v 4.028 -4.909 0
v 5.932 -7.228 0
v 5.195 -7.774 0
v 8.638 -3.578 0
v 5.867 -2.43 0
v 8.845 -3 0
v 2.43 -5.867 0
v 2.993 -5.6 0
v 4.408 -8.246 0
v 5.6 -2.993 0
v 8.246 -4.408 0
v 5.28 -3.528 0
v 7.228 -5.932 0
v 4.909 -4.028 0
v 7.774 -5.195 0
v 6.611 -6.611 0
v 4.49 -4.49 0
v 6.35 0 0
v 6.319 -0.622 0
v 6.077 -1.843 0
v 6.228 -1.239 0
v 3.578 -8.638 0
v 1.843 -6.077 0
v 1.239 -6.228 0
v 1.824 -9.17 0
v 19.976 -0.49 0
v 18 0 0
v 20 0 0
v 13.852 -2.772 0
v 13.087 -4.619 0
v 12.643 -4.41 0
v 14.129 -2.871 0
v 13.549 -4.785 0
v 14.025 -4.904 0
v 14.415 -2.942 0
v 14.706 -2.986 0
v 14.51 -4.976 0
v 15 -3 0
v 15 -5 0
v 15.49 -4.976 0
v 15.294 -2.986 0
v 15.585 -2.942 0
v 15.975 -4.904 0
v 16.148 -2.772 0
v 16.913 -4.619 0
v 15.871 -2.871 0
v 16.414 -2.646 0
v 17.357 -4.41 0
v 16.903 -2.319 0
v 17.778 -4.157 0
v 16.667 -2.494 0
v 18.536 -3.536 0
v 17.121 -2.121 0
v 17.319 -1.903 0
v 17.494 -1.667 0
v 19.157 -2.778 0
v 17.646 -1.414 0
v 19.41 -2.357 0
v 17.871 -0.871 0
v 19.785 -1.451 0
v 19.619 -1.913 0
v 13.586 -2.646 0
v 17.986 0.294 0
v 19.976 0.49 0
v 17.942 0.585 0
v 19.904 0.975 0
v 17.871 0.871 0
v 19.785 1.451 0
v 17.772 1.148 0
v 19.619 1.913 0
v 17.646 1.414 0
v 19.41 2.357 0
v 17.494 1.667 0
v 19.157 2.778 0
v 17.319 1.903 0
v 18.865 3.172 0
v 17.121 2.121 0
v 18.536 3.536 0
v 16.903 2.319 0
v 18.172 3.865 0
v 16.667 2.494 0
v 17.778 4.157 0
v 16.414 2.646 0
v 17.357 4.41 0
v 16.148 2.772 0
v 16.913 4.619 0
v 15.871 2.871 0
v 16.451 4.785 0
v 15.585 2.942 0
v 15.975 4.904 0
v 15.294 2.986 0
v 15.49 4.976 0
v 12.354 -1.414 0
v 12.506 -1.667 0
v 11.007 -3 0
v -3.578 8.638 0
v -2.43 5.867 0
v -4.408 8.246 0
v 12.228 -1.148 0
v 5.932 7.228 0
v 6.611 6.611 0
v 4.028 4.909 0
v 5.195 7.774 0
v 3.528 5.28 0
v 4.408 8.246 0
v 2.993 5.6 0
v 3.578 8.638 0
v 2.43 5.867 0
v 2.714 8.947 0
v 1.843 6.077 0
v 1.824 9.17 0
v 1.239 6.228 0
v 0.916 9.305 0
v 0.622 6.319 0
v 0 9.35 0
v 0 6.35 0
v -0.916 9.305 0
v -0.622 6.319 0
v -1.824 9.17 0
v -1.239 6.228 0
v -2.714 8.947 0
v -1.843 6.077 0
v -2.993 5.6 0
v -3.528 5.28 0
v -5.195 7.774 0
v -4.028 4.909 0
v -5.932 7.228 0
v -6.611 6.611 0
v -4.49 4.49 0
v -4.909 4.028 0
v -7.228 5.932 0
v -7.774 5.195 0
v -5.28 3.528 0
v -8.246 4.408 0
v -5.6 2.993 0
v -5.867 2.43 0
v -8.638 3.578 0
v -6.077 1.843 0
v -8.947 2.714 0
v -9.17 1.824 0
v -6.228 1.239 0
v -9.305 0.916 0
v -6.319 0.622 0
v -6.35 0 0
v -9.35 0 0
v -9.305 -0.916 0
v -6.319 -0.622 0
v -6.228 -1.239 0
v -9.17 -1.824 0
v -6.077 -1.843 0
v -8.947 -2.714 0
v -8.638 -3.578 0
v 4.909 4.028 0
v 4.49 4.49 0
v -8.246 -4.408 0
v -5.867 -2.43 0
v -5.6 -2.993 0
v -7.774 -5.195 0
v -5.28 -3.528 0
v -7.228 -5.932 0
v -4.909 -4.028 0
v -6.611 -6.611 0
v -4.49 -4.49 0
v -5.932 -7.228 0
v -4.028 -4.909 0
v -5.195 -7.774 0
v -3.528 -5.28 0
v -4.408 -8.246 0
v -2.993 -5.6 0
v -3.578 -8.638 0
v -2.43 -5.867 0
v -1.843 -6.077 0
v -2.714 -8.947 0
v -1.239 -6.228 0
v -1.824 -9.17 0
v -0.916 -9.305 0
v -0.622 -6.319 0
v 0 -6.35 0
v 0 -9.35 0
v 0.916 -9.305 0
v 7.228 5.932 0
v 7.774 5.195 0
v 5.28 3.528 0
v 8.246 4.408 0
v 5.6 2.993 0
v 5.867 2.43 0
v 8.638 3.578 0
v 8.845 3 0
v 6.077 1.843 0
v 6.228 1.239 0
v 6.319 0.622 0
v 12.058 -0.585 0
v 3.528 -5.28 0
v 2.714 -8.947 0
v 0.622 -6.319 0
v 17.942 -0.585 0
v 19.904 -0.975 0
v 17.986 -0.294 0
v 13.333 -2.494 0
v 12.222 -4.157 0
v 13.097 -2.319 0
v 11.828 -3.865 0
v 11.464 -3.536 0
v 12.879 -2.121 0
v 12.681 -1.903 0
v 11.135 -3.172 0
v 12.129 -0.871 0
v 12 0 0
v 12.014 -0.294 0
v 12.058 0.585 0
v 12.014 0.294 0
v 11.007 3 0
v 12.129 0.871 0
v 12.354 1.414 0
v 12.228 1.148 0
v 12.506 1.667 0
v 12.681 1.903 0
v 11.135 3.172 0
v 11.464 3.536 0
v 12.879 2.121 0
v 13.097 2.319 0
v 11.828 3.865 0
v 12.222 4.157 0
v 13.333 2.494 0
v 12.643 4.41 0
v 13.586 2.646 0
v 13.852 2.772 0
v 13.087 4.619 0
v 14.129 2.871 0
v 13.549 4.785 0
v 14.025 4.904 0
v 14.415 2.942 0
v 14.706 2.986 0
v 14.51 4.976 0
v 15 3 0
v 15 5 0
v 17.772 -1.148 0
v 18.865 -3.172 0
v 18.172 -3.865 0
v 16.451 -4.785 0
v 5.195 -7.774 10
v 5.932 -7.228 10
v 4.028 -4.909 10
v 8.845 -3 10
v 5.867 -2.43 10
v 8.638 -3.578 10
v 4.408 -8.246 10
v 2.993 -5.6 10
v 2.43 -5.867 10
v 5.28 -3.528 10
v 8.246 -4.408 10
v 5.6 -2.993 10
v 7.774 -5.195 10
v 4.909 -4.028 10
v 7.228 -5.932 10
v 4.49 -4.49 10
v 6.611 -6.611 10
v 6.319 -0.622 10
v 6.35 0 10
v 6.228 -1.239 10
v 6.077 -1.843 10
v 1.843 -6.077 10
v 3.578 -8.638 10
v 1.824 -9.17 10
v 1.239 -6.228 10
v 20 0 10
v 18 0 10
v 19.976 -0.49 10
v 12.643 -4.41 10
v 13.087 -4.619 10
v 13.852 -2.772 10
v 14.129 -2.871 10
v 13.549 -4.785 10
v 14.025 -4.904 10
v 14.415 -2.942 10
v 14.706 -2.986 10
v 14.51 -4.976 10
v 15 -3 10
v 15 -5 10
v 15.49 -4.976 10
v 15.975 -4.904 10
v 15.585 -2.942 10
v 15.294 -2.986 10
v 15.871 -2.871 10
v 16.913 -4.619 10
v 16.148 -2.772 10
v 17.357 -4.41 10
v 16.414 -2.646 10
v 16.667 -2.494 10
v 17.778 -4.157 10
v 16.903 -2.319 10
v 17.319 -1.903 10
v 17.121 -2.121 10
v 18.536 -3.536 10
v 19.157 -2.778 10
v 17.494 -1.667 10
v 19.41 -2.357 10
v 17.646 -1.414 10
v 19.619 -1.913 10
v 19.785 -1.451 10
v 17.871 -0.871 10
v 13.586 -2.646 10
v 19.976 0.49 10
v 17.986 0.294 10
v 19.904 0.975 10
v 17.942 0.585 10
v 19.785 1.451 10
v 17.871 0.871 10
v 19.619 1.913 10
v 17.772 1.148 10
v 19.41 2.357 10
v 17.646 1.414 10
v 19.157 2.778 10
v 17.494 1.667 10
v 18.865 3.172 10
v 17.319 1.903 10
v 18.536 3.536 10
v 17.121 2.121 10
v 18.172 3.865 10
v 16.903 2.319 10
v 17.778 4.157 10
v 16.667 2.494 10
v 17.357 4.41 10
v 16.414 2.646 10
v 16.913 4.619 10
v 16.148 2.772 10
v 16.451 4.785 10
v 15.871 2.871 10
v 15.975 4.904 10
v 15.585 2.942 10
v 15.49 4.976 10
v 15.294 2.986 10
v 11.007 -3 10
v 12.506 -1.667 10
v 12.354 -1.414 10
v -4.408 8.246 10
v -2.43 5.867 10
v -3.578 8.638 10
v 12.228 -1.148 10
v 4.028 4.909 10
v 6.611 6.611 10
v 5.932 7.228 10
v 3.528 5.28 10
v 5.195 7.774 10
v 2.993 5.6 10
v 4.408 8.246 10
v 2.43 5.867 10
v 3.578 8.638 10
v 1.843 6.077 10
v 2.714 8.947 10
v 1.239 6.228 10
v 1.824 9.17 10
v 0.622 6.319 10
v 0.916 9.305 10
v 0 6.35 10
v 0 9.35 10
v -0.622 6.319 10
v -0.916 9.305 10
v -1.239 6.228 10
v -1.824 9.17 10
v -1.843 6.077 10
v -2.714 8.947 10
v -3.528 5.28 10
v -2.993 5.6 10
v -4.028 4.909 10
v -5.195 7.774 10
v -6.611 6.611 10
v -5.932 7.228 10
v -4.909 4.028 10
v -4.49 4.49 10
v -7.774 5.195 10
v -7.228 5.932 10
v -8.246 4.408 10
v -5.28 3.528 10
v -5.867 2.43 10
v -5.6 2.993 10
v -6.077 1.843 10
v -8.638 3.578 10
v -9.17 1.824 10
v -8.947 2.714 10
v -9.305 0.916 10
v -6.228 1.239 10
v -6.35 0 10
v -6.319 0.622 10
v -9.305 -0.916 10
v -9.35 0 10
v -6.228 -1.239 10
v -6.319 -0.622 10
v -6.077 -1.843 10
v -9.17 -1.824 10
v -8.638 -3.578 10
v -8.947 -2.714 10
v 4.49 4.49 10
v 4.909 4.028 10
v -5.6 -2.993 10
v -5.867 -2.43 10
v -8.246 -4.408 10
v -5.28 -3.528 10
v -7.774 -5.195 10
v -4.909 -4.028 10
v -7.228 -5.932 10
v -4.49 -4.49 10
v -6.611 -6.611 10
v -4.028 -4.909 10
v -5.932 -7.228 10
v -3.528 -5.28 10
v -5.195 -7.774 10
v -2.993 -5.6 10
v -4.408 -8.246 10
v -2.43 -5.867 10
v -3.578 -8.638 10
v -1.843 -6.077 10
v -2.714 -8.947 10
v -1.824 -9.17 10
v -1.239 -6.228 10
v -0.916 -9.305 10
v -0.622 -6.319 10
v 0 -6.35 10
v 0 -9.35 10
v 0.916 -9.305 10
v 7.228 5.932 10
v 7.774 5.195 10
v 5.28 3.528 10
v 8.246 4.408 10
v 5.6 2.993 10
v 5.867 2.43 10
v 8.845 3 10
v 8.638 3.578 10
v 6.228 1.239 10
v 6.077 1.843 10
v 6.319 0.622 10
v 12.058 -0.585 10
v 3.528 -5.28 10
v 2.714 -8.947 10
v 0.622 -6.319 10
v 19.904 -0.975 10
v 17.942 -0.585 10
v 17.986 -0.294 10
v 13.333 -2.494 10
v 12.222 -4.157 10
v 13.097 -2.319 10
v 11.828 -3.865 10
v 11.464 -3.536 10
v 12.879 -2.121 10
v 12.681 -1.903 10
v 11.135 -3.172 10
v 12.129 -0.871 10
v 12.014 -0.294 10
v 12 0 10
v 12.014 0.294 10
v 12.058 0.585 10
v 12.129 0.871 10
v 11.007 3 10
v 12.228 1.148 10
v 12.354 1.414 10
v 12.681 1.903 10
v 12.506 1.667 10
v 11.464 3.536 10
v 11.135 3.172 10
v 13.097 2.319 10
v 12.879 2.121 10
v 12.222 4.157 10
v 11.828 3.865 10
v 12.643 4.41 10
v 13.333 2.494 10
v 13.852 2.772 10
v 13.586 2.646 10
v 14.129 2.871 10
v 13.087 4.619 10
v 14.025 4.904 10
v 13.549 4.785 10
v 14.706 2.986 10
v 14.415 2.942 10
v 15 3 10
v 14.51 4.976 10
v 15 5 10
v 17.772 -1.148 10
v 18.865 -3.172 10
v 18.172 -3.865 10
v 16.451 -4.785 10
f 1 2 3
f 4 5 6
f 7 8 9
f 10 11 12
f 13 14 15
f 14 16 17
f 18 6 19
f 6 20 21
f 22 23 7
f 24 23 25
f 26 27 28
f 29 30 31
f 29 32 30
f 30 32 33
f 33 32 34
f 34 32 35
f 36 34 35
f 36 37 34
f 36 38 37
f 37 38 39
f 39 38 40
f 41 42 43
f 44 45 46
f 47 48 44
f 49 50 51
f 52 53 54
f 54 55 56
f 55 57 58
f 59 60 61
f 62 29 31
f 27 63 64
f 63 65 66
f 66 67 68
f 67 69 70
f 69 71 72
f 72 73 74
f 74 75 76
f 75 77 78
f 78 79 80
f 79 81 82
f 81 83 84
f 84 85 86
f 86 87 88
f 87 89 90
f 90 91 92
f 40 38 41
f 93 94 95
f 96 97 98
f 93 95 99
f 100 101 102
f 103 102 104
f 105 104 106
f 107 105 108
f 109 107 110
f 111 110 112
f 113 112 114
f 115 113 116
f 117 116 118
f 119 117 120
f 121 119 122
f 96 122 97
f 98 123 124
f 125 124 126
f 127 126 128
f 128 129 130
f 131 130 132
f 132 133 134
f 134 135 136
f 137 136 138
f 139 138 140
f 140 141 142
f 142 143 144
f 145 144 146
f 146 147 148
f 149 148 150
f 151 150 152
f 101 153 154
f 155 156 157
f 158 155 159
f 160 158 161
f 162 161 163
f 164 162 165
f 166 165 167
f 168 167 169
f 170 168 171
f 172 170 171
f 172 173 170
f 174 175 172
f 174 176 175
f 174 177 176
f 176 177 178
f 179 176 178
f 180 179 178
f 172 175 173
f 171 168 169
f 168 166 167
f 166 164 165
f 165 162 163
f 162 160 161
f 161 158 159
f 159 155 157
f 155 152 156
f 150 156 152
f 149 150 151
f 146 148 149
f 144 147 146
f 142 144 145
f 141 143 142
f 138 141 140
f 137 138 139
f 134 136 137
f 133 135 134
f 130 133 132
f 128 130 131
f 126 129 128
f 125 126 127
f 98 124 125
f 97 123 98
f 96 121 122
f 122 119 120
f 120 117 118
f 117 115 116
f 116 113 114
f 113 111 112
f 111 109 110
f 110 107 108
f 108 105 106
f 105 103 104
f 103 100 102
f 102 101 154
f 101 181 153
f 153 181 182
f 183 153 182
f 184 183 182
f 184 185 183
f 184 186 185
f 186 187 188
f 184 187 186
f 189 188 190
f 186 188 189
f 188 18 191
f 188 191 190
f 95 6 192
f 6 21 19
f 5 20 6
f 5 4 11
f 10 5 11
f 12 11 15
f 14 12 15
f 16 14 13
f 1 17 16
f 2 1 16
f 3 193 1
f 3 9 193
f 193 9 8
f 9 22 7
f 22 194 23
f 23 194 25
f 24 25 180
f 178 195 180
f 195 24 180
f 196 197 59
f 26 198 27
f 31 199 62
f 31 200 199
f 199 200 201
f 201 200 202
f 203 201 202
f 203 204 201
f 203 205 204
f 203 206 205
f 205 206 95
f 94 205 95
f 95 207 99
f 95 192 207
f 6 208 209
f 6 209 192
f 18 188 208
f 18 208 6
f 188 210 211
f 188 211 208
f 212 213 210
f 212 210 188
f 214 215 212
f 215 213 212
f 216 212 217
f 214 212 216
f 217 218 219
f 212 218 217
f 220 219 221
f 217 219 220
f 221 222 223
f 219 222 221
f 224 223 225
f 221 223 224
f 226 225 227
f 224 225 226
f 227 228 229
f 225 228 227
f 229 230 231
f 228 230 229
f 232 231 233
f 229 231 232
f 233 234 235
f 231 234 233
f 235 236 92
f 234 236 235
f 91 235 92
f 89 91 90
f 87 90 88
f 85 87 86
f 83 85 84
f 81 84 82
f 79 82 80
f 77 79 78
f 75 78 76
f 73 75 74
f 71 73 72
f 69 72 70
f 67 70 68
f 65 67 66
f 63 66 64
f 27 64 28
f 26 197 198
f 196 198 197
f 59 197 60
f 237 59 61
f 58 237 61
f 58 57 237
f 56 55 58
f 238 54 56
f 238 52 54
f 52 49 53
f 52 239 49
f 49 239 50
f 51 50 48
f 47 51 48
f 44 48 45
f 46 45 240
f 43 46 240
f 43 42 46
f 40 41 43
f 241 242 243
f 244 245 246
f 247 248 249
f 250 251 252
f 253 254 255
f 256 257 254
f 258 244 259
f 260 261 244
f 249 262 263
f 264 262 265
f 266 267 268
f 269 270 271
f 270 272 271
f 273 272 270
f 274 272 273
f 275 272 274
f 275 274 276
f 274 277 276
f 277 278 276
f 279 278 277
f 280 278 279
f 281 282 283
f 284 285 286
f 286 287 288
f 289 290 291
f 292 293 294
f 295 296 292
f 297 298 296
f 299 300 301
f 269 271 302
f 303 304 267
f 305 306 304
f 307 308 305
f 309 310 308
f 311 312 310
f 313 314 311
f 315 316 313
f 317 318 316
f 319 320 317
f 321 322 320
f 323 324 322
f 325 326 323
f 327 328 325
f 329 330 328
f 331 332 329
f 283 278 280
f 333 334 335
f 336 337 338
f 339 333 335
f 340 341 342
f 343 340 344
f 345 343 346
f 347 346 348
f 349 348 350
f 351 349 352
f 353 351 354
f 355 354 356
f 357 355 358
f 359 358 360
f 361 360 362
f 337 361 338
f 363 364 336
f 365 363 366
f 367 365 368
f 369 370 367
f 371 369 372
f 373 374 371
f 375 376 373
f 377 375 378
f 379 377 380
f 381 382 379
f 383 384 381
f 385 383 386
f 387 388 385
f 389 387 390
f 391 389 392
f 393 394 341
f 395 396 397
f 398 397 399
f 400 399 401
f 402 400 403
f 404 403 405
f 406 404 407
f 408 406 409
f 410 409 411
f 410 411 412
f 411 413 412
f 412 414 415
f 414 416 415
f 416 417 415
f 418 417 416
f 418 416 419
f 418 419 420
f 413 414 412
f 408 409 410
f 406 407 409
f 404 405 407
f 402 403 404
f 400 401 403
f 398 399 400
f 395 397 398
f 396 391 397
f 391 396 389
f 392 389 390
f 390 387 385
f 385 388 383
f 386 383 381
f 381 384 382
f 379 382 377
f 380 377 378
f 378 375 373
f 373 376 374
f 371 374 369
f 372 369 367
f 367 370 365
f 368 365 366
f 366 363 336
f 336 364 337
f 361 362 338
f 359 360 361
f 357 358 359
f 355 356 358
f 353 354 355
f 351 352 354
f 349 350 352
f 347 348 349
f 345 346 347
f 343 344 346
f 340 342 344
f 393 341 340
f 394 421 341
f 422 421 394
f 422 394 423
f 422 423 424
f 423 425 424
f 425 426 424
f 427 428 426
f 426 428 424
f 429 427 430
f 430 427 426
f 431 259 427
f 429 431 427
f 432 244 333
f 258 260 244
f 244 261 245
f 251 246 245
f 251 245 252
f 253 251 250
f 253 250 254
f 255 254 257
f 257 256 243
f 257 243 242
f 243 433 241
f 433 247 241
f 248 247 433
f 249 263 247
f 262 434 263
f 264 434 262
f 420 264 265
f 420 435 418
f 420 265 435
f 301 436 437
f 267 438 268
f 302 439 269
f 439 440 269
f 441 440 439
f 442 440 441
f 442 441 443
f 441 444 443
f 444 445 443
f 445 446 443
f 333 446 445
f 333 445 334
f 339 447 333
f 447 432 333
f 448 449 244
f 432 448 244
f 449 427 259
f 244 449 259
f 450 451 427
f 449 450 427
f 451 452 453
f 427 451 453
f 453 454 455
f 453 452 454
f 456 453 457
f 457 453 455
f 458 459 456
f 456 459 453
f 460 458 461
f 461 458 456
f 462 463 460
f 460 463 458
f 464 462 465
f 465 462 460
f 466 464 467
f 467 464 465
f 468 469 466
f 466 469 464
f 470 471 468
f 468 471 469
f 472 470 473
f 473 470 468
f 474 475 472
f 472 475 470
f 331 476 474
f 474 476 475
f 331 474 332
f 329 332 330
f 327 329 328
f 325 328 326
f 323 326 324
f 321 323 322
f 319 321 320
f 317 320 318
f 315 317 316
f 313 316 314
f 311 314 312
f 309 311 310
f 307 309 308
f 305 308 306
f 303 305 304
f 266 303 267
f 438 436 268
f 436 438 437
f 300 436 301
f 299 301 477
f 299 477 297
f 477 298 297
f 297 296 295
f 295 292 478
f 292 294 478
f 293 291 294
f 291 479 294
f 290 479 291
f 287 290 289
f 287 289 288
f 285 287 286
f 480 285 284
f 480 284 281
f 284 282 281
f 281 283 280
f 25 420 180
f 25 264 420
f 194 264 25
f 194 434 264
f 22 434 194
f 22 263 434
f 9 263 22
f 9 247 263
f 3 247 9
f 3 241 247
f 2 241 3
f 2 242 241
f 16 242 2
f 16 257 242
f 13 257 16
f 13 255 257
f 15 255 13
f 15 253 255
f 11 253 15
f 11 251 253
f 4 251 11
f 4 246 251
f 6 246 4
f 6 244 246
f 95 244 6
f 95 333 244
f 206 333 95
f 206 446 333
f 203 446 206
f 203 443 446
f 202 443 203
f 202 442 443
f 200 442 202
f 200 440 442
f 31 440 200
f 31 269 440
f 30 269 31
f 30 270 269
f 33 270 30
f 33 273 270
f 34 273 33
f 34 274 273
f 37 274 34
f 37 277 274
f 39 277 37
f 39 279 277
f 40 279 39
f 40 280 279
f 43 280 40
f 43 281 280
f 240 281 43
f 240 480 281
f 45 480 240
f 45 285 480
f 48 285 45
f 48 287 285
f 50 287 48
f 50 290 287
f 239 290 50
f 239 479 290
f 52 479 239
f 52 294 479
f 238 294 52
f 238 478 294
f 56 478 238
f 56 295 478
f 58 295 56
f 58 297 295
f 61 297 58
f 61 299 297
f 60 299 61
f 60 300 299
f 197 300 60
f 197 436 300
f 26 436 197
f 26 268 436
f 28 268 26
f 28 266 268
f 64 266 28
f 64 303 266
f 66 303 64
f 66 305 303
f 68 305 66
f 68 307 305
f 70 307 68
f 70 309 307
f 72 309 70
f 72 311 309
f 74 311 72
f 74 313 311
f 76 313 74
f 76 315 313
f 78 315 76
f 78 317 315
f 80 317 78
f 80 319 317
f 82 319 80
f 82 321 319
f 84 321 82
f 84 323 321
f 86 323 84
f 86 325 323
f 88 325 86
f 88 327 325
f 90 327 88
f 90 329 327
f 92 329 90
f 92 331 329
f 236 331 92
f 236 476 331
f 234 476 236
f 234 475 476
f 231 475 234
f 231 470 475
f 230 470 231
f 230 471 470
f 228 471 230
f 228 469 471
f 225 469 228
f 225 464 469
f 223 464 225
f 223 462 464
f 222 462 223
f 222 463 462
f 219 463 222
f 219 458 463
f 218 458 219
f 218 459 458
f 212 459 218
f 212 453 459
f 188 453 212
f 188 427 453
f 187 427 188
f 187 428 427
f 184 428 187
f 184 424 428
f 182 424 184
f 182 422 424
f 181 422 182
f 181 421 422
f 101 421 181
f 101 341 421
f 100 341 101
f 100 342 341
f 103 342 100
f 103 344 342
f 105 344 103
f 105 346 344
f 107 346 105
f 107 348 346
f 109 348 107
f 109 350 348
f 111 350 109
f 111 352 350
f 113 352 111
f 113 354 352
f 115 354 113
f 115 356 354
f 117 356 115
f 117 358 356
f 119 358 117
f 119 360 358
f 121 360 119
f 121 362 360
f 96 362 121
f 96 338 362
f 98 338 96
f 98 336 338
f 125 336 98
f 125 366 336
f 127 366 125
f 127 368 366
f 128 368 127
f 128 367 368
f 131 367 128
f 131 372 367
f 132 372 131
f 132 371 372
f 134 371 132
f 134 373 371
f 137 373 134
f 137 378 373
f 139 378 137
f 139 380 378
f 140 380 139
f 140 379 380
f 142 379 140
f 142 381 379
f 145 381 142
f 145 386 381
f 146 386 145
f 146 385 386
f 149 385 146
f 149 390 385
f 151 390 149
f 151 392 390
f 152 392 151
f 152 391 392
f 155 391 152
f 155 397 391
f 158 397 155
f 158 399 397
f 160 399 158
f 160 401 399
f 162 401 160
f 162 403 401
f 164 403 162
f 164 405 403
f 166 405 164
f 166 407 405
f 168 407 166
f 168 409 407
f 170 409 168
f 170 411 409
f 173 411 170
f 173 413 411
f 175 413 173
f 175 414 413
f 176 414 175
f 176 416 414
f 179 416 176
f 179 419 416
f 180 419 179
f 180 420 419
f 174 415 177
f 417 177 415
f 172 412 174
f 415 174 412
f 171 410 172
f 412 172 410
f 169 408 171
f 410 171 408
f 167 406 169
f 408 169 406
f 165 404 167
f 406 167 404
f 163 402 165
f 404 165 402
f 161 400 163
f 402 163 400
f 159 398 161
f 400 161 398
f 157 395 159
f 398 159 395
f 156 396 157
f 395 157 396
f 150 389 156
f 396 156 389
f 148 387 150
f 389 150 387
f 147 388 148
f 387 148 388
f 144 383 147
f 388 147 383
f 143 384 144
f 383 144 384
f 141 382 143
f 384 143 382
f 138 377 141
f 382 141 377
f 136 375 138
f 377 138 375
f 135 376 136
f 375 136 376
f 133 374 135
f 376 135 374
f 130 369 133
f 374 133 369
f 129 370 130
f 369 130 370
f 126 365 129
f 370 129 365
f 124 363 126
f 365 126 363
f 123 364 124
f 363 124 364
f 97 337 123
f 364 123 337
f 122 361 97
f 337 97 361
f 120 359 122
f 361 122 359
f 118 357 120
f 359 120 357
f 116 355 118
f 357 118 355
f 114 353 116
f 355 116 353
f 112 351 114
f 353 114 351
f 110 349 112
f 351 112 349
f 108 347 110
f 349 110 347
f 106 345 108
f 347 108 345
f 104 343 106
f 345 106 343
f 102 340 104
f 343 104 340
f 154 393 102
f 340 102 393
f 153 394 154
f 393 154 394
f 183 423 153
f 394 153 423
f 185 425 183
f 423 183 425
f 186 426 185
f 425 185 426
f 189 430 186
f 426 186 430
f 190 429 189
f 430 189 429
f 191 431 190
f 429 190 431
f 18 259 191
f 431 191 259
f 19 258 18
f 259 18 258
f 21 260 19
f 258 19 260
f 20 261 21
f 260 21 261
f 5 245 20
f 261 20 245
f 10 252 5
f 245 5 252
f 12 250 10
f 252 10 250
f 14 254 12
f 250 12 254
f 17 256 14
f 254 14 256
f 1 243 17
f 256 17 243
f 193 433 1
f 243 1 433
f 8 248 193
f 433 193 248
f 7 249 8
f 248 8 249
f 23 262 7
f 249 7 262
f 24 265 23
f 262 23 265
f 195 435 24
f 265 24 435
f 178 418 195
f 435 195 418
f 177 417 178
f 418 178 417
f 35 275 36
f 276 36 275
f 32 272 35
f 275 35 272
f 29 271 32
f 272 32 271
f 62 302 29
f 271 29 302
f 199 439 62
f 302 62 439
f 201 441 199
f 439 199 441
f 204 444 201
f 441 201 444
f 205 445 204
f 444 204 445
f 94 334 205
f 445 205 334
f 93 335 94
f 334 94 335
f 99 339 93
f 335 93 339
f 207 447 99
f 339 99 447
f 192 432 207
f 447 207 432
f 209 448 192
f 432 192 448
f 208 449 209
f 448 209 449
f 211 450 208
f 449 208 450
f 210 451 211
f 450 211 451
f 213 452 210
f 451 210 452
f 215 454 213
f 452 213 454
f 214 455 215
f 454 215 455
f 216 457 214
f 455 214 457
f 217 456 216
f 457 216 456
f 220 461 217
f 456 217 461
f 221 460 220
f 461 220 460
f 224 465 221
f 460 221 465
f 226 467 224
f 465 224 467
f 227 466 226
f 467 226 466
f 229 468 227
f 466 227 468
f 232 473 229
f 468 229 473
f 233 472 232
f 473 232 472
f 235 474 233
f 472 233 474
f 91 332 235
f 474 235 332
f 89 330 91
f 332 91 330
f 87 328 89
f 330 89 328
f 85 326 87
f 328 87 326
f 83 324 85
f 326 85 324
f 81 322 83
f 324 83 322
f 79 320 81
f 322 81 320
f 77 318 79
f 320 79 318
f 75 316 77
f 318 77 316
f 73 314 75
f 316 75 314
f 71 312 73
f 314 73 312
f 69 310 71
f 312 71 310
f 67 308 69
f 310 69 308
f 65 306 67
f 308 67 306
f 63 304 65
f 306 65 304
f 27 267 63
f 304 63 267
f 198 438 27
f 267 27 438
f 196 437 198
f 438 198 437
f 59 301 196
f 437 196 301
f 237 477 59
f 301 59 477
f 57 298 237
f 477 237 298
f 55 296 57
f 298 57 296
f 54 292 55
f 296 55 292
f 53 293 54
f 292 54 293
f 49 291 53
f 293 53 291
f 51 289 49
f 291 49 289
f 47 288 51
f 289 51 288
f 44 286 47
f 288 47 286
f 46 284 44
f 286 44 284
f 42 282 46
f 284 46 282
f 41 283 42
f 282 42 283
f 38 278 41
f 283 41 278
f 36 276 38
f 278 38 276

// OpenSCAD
// Snap-on clip for 12.7 mm lab stand rod and 6 mm ID tubing
// Printed flat (Z = 10 mm extrusion of XY profile)

// Global settings
$fn = 64;
height = 10; // Extrusion height in Z

// Rod ring dimensions
rod_id = 12.7; // Inner diameter of rod ring
rod_wall = 3; // Wall thickness of rod ring
rod_od = rod_id + 2 * rod_wall; // Outer diameter of rod ring (18.7 mm)

// Rod ring cutout dimensions
rod_cutout_width = 10; // Width of the opening on the -X side
rod_cutout_half_width = rod_cutout_width / 2; // Half-width for symmetric bounds

// Tubing ring dimensions
tubing_id = 6; // Inner diameter of tubing ring
tubing_wall = 2; // Wall thickness of tubing ring
tubing_od = tubing_id + 2 * tubing_wall; // Outer diameter of tubing ring (10 mm)
tubing_center_x = 15; // X-coordinate of tubing ring center

// Tubing ring cutout dimensions
tubing_cutout_width = 4.5; // Width of the opening on the +X side
tubing_cutout_half_width = tubing_cutout_width / 2; // Half-width for symmetric bounds

// Bridge dimensions
bridge_x_start = 8; // Start X of the bridge
bridge_x_end = 12; // End X of the bridge
bridge_width = 6; // Width of the bridge in Y
bridge_half_width = bridge_width / 2; // Half-width for symmetric bounds

// Safety margin for cuts (ensures no coplanar faces)
cut_margin = 0.5;

// Main module
linear_extrude(height = height, center = false, convexity = 10) {
    union() {
        // Rod ring centered at origin
        difference() {
            // Outer circle of rod ring
            circle(r = rod_od / 2);
            // Inner hole of rod ring
            circle(r = rod_id / 2);
            // Cutout on -X side: removes everything with x < 0 and -5 < y < 5
            // We use a large rectangle extending far to the left to ensure full cut
            // The cutout is defined as x < 0, so we place the rectangle such that its right edge is at x=0
            // To ensure it cuts through, we extend it to the left by rod_od + margin
            translate([-rod_od - cut_margin, 0])
                square([rod_od + cut_margin, rod_cutout_width + 2 * cut_margin], center = true);
        }

        // Tubing ring centered at (15, 0)
        difference() {
            // Outer circle of tubing ring
            translate([tubing_center_x, 0])
                circle(r = tubing_od / 2);
            // Inner hole of tubing ring
            translate([tubing_center_x, 0])
                circle(r = tubing_id / 2);
            // Cutout on +X side: removes everything with x > 15 and -2.25 < y < 2.25
            // We use a large rectangle extending far to the right to ensure full cut
            // The cutout is defined as x > 15, so we place the rectangle such that its left edge is at x=15
            translate([tubing_center_x + tubing_od + cut_margin, 0])
                square([tubing_od + cut_margin, tubing_cutout_width + 2 * cut_margin], center = true);
        }

        // Solid bridge between x = 8 and x = 12, width 6 mm in Y
        // Centered on Y axis
        translate([bridge_x_start, -bridge_half_width])
            square([bridge_x_end - bridge_x_start, bridge_width]);
    }
}
